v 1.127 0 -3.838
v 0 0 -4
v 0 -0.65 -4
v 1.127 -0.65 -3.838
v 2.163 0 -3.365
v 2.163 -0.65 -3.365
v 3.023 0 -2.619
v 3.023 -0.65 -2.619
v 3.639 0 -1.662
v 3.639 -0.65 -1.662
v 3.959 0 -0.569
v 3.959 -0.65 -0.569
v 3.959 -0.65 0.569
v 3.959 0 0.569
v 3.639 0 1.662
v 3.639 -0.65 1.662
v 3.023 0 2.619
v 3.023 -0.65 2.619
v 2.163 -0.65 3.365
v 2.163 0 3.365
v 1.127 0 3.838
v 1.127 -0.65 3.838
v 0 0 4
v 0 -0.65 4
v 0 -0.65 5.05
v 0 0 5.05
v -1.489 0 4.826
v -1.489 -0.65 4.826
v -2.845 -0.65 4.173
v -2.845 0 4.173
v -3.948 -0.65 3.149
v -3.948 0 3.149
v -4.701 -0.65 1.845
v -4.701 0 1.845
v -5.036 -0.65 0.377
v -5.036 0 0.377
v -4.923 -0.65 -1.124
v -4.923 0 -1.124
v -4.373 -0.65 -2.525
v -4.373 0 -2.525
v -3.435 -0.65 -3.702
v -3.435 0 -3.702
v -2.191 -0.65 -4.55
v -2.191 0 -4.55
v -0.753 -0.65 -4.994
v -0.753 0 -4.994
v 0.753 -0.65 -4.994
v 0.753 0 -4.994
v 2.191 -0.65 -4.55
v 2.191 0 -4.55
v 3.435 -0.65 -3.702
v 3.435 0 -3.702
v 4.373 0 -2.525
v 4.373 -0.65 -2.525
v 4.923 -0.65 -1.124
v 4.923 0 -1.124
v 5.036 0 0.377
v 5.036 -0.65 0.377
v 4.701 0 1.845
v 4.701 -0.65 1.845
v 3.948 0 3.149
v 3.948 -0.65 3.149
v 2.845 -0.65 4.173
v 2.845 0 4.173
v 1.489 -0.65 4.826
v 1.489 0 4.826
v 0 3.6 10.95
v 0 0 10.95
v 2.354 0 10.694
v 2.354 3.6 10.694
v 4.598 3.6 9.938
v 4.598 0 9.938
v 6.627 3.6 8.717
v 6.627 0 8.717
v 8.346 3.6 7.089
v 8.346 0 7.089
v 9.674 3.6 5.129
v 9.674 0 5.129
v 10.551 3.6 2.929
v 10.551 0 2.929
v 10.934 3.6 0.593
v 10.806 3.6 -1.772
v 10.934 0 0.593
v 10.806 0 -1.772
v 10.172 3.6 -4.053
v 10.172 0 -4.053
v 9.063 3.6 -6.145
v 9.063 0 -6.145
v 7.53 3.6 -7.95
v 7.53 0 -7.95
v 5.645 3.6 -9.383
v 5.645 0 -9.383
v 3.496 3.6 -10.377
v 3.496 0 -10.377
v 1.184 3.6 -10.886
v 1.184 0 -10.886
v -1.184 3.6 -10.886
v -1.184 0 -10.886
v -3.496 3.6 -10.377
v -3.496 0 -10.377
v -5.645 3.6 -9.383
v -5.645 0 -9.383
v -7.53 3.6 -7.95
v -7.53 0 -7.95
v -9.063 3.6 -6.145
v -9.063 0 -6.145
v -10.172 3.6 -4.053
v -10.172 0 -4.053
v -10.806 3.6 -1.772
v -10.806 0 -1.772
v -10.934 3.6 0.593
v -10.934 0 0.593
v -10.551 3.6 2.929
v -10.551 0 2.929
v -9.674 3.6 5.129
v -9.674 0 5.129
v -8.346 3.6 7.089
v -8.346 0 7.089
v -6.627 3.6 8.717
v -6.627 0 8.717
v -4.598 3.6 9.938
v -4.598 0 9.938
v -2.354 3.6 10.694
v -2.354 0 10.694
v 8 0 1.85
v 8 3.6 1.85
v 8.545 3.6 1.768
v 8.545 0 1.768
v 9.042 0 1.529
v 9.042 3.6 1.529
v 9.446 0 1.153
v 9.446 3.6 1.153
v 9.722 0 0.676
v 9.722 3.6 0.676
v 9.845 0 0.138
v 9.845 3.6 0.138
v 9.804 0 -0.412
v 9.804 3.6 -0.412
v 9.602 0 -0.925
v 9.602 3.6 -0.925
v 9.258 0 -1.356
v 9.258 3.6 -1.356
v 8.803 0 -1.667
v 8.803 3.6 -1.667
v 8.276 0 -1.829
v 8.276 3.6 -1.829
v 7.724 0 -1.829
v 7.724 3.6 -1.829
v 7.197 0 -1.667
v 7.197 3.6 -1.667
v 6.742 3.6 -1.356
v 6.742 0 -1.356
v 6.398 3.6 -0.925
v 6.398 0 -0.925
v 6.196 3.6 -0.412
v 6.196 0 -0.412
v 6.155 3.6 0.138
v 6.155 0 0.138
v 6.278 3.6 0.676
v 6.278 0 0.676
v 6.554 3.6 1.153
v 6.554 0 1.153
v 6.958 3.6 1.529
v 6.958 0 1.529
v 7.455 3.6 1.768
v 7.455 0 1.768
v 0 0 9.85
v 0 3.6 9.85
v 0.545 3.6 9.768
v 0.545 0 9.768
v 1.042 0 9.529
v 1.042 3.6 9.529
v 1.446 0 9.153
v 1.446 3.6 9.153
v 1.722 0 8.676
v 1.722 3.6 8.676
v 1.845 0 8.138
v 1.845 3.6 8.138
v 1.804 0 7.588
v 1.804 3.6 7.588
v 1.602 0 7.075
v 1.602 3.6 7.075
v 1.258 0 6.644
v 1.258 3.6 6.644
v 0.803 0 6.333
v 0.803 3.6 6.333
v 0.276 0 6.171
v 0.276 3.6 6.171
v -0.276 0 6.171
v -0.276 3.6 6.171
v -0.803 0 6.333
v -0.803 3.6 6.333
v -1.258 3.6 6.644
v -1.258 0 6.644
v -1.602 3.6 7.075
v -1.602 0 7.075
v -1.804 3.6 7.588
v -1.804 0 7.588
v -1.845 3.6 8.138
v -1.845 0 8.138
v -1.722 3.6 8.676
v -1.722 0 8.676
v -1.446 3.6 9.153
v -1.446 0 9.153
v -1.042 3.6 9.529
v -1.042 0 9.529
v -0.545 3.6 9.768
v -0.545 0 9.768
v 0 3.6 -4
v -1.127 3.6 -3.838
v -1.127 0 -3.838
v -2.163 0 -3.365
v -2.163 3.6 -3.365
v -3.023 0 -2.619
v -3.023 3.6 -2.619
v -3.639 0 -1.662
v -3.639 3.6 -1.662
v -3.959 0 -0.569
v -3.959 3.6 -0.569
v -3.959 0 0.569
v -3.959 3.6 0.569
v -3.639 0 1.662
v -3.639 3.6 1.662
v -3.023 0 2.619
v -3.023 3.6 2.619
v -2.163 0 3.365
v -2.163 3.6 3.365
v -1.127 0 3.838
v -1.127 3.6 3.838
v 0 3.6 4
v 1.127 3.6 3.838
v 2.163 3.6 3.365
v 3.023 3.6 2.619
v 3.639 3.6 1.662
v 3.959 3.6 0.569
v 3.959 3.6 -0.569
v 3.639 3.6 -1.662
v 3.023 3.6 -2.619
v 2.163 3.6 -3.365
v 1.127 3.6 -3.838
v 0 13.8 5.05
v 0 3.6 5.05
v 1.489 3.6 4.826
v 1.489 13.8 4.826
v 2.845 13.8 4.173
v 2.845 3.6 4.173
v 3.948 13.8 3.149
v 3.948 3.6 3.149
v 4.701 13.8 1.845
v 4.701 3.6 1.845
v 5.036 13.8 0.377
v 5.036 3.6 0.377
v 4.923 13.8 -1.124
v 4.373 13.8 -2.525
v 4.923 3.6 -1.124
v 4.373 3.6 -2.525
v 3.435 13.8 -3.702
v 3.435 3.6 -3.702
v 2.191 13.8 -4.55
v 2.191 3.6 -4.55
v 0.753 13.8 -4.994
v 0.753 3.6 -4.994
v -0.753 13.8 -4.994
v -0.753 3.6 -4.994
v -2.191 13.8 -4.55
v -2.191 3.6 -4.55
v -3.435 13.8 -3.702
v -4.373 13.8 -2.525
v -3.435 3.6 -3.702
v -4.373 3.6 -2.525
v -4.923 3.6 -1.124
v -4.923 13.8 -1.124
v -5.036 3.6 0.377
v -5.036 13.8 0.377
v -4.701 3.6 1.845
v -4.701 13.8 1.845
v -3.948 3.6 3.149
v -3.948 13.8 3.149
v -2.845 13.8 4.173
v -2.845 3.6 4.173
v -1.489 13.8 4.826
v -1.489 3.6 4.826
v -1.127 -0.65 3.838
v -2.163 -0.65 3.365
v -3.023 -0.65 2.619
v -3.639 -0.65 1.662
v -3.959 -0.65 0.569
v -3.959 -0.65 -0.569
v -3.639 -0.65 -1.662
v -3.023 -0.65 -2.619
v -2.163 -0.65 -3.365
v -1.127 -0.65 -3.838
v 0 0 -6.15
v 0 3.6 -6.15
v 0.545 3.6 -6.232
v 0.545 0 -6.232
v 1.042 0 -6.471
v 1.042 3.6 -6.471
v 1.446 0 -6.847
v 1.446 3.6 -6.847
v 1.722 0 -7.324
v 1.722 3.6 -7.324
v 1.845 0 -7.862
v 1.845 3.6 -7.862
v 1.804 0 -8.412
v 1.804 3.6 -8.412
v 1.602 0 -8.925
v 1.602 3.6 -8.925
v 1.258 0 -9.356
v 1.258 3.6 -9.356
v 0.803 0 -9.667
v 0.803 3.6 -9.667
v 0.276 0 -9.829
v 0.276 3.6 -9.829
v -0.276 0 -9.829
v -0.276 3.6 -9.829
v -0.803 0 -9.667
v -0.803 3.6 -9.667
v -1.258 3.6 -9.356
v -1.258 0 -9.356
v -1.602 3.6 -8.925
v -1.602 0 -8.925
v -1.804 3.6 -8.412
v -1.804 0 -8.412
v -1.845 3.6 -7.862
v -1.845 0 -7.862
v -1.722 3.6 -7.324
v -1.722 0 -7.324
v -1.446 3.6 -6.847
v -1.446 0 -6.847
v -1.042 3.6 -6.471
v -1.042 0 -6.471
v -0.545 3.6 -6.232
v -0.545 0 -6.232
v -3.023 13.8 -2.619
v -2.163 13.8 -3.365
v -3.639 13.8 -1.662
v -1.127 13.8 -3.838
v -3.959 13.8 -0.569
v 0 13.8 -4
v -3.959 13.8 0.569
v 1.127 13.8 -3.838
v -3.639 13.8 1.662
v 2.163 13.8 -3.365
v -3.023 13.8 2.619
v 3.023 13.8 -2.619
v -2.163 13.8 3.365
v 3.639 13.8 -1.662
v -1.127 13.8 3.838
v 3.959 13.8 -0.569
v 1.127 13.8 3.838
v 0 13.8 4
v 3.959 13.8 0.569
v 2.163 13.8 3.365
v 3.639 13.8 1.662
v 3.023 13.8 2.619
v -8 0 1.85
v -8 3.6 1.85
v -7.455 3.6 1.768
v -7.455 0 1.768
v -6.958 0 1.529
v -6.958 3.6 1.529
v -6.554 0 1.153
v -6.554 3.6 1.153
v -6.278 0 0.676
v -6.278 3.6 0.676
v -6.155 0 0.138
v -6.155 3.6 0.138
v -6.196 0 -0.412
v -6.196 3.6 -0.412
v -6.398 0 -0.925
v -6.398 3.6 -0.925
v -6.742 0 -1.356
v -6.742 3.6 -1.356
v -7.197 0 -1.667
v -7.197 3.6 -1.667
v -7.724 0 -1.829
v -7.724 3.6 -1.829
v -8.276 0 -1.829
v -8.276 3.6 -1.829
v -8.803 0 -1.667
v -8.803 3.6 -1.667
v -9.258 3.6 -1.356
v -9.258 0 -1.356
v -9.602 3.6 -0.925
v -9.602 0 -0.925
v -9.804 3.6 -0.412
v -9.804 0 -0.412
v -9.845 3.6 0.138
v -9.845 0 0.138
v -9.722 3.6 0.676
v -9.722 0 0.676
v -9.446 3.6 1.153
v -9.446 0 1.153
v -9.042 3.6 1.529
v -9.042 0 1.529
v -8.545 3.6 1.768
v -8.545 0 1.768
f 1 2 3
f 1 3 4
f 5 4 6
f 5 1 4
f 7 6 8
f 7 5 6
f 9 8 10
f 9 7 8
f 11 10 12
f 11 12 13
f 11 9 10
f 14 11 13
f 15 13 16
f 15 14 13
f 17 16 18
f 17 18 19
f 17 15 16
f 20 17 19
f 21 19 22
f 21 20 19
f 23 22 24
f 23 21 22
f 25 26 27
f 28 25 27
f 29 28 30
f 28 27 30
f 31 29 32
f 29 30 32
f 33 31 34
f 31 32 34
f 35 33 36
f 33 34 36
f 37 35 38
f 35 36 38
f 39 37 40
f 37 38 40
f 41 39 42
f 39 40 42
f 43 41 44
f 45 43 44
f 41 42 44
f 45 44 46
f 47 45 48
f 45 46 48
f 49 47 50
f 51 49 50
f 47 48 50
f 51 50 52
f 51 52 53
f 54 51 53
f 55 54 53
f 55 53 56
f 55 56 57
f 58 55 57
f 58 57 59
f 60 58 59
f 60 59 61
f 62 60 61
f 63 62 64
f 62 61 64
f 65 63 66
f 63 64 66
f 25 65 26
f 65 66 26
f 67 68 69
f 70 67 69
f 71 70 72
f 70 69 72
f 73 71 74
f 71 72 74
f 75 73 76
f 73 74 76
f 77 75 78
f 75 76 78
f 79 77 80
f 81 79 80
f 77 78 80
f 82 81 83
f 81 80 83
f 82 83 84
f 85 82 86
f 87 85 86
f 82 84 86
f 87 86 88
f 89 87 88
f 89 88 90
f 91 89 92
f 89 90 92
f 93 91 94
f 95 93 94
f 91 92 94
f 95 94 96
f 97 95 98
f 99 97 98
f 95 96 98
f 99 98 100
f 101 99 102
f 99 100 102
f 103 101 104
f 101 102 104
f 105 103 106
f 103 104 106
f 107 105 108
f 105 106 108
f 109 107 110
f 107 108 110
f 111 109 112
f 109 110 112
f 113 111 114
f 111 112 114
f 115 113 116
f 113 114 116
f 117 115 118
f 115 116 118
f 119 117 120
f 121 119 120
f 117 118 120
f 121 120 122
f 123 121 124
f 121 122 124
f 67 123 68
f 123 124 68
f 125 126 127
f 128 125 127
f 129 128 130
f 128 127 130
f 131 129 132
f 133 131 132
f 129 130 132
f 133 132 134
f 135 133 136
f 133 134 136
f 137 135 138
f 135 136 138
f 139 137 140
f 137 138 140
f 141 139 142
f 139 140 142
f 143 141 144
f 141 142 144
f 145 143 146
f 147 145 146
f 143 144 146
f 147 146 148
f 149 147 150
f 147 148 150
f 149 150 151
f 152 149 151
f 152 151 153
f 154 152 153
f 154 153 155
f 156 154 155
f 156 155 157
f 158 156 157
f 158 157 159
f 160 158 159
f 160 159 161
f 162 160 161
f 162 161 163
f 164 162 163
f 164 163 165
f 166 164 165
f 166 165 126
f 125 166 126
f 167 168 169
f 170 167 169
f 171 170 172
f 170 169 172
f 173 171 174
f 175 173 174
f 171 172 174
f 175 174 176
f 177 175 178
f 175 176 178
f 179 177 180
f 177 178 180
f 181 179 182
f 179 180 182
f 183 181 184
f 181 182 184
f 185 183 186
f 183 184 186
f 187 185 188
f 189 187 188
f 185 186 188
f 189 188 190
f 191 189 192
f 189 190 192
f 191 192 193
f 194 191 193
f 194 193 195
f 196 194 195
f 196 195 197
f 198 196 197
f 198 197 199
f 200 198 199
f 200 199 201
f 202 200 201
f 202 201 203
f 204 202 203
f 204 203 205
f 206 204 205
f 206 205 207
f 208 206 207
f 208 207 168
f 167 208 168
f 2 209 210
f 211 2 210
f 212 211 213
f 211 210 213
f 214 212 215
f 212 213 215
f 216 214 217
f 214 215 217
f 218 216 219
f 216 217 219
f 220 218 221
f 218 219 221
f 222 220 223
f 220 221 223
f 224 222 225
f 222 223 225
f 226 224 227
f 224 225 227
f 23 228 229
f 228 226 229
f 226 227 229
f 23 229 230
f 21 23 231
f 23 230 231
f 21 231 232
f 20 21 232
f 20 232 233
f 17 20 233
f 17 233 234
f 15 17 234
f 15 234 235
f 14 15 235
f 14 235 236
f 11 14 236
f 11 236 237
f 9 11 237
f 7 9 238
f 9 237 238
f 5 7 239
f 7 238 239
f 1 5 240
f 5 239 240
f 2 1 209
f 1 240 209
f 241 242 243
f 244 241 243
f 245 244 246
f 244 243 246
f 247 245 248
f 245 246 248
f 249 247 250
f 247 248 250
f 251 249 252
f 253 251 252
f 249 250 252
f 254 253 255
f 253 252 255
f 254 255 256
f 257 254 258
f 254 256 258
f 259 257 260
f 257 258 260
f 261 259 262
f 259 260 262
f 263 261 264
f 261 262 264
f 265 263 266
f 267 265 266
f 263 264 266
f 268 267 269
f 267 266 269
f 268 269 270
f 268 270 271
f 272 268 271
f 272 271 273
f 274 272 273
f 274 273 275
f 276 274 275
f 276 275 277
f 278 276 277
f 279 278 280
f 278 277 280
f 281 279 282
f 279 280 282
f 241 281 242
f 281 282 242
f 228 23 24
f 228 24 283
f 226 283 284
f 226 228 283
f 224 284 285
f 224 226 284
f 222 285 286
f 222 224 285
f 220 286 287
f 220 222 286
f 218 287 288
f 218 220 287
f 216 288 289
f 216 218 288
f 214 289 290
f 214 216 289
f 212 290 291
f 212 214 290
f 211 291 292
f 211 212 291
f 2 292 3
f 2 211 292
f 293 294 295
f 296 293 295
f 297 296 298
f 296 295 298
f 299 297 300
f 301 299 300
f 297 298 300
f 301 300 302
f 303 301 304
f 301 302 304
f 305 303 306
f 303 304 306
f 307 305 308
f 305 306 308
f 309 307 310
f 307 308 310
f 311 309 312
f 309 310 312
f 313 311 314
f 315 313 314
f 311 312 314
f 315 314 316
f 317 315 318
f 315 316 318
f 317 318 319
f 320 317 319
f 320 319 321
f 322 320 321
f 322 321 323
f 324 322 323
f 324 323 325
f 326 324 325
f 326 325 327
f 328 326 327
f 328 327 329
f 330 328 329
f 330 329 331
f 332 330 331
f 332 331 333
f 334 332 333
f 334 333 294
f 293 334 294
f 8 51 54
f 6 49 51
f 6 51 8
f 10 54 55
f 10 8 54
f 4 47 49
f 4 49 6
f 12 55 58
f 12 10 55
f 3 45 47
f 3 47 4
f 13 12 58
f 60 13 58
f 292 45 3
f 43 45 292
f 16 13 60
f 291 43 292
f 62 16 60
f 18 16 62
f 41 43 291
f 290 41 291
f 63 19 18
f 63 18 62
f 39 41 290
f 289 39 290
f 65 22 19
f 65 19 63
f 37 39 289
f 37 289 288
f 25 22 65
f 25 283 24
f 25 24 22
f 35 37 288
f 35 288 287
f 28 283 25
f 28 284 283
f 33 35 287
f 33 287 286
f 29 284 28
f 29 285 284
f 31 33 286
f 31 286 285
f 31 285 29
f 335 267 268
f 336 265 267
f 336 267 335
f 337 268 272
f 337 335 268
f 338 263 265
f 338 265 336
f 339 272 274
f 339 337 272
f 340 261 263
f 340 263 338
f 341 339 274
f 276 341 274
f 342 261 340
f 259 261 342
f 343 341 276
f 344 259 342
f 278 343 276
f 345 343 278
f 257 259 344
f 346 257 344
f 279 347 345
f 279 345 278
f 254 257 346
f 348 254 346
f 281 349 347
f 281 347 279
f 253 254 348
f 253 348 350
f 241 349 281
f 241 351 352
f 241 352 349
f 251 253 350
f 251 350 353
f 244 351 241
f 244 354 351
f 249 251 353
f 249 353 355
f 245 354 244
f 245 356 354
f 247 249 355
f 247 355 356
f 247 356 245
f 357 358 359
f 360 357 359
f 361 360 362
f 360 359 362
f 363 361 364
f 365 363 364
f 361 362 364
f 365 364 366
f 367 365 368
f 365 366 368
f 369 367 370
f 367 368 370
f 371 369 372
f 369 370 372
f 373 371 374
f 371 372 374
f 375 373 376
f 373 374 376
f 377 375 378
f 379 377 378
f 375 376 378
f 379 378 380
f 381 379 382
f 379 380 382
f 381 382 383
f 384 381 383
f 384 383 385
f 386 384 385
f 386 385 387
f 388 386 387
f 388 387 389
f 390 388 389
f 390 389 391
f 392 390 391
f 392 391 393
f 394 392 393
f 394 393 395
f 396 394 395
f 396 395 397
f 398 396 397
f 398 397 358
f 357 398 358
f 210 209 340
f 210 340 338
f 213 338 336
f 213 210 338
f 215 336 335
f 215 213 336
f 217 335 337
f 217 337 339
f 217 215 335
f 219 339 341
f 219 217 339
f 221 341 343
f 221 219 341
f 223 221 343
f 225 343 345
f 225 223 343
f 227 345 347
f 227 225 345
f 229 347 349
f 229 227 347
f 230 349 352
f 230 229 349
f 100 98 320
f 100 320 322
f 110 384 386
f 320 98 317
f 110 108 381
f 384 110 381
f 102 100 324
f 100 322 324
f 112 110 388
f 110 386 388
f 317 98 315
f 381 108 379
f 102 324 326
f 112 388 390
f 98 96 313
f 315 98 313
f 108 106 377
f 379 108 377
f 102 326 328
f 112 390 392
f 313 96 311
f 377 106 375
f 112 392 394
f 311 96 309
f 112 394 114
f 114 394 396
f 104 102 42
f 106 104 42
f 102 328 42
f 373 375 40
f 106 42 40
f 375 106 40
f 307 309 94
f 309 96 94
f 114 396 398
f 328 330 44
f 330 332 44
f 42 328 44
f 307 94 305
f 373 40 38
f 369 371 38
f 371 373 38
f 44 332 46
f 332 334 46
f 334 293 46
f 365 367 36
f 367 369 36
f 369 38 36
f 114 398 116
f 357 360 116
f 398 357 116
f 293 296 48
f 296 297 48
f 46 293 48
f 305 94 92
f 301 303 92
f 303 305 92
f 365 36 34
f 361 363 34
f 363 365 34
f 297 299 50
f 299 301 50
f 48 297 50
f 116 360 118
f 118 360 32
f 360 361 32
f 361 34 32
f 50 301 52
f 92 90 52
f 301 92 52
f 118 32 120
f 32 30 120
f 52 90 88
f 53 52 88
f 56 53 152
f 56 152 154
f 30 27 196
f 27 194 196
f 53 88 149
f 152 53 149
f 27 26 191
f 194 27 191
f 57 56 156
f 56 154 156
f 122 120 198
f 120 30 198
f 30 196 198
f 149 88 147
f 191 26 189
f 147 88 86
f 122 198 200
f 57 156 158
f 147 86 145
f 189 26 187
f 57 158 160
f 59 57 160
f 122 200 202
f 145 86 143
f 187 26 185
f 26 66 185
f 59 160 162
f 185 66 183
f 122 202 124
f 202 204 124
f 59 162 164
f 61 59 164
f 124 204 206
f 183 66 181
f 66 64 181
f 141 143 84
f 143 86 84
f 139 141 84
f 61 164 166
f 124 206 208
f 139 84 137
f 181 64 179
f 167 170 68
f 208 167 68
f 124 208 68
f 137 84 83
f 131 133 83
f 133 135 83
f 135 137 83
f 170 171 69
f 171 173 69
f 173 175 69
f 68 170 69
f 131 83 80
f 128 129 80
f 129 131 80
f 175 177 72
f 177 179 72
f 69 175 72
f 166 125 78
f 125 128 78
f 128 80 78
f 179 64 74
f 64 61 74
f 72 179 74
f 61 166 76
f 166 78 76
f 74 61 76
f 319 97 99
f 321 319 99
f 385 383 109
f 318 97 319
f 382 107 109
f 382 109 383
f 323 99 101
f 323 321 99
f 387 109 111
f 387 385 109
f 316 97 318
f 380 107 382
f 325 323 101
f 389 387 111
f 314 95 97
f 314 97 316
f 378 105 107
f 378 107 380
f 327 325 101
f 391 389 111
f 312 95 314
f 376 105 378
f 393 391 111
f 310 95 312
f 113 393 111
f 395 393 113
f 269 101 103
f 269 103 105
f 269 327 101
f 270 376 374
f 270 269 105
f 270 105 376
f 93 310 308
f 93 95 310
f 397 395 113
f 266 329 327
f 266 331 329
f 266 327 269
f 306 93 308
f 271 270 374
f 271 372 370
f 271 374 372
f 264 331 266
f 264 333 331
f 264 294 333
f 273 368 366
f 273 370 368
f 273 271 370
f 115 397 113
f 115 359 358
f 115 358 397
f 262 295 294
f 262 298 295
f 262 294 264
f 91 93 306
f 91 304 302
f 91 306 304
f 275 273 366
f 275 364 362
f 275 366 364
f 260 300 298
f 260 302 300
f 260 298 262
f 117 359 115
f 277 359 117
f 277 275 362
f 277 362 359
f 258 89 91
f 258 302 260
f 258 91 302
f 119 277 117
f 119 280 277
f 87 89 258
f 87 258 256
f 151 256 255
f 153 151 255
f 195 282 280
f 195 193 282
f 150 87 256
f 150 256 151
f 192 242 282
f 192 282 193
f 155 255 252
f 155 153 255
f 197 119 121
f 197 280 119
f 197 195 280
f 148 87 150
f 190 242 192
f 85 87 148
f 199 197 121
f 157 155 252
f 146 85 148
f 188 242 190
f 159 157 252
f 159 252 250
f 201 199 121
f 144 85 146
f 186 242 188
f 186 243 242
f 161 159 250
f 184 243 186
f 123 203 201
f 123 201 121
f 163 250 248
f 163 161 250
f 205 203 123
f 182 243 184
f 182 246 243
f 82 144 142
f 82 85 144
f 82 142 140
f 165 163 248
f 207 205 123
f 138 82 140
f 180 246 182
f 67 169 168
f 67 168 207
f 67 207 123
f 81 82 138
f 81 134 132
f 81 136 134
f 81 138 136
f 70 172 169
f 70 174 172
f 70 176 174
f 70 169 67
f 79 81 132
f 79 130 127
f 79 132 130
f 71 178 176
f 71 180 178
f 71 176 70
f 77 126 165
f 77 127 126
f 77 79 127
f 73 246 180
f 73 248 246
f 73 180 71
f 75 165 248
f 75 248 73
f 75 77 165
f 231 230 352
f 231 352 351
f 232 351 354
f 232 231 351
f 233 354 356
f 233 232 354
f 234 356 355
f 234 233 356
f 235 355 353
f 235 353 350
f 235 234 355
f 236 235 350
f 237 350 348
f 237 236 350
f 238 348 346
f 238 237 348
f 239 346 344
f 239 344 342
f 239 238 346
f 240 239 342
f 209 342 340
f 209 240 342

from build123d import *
from build123d.topology import SkipClean

# Parameters (mm, degrees)
SKETCH1_R               = 10.95
BOSS_EXTRUDE1_DEPTH     = 3.6
SKETCH2_R               = 5.05
SKETCH2_R_2             = 4
BOSS_EXTRUDE2_DEPTH     = 10.2
SKETCH3_R               = 5.05
SKETCH3_R_2             = 4
BOSS_EXTRUDE4_DEPTH     = 0.65
SKETCH4_R               = 1.85
SKETCH4_R_2             = 4
CUT_EXTRUDE1_DEPTH      = 11.2
CUT_EXTRUDE1_DEPTH_BACK = 5.25


with BuildPart() as part:
    # Sketch1 → Boss-Extrude1 (new body)
    with BuildSketch(Plane(origin=(0, 0, 0), x_dir=(1, 0, 0), z_dir=(0, 1, 0))):
        with Locations(Location((0, 0, 0), (0, 0, 270))):  # turned: the seam where the file's is
            Circle(SKETCH1_R)
    extrude(amount=BOSS_EXTRUDE1_DEPTH)

    # Sketch2 → Boss-Extrude2 (add)
    with BuildSketch(Plane(origin=(0, 3.6, 0), x_dir=(1, 0, 0), z_dir=(0, 1, 0))):
        with Locations(Location((0, 0, 0), (0, 0, 270))):  # turned: the seam where the file's is
            Circle(SKETCH2_R)
        with Locations(Location((0, 0, 0), (0, 0, 270))):  # turned: the seam where the file's is
            Circle(SKETCH2_R_2, mode=Mode.SUBTRACT)
    extrude(amount=BOSS_EXTRUDE2_DEPTH)

    # Sketch3 → Boss-Extrude4 (add)
    with BuildSketch(Plane.XZ):
        with Locations(Location((0, 0, 0), (0, 0, 90))):  # turned: the seam where the file's is
            Circle(SKETCH3_R)
        with Locations(Location((0, 0, 0), (0, 0, 90))):  # turned: the seam where the file's is
            Circle(SKETCH3_R_2, mode=Mode.SUBTRACT)
    extrude(amount=BOSS_EXTRUDE4_DEPTH)

    # Sketch4 → Cut-Extrude1 (cut, two sides)
    with SkipClean():  # keep this step's faces unmerged: merging them makes the solid invalid here
        with BuildSketch(Plane(origin=(0, 3.6, 0), x_dir=(1, 0, 0), z_dir=(0, 1, 0))) as cut_extrude1_sk:
            with Locations(Location((0, 8, 0), (0, 0, 270))):  # turned: the seam where the file's is
                Circle(SKETCH4_R)
            with Locations(Location((0, 0, 0), (0, 0, 90))):  # turned: the seam where the file's is
                Circle(SKETCH4_R_2)
            with Locations(Location((8, 0, 0), (0, 0, 270))):  # turned: the seam where the file's is
                Circle(SKETCH4_R)
            with Locations(Location((0, -8, 0), (0, 0, 270))):  # turned: the seam where the file's is
                Circle(SKETCH4_R)
            with Locations(Location((-8, 0, 0), (0, 0, 270))):  # turned: the seam where the file's is
                Circle(SKETCH4_R)
        extrude(amount=CUT_EXTRUDE1_DEPTH, mode=Mode.SUBTRACT)
        extrude(cut_extrude1_sk.sketch, amount=-CUT_EXTRUDE1_DEPTH_BACK, mode=Mode.SUBTRACT)


solid = part.part
